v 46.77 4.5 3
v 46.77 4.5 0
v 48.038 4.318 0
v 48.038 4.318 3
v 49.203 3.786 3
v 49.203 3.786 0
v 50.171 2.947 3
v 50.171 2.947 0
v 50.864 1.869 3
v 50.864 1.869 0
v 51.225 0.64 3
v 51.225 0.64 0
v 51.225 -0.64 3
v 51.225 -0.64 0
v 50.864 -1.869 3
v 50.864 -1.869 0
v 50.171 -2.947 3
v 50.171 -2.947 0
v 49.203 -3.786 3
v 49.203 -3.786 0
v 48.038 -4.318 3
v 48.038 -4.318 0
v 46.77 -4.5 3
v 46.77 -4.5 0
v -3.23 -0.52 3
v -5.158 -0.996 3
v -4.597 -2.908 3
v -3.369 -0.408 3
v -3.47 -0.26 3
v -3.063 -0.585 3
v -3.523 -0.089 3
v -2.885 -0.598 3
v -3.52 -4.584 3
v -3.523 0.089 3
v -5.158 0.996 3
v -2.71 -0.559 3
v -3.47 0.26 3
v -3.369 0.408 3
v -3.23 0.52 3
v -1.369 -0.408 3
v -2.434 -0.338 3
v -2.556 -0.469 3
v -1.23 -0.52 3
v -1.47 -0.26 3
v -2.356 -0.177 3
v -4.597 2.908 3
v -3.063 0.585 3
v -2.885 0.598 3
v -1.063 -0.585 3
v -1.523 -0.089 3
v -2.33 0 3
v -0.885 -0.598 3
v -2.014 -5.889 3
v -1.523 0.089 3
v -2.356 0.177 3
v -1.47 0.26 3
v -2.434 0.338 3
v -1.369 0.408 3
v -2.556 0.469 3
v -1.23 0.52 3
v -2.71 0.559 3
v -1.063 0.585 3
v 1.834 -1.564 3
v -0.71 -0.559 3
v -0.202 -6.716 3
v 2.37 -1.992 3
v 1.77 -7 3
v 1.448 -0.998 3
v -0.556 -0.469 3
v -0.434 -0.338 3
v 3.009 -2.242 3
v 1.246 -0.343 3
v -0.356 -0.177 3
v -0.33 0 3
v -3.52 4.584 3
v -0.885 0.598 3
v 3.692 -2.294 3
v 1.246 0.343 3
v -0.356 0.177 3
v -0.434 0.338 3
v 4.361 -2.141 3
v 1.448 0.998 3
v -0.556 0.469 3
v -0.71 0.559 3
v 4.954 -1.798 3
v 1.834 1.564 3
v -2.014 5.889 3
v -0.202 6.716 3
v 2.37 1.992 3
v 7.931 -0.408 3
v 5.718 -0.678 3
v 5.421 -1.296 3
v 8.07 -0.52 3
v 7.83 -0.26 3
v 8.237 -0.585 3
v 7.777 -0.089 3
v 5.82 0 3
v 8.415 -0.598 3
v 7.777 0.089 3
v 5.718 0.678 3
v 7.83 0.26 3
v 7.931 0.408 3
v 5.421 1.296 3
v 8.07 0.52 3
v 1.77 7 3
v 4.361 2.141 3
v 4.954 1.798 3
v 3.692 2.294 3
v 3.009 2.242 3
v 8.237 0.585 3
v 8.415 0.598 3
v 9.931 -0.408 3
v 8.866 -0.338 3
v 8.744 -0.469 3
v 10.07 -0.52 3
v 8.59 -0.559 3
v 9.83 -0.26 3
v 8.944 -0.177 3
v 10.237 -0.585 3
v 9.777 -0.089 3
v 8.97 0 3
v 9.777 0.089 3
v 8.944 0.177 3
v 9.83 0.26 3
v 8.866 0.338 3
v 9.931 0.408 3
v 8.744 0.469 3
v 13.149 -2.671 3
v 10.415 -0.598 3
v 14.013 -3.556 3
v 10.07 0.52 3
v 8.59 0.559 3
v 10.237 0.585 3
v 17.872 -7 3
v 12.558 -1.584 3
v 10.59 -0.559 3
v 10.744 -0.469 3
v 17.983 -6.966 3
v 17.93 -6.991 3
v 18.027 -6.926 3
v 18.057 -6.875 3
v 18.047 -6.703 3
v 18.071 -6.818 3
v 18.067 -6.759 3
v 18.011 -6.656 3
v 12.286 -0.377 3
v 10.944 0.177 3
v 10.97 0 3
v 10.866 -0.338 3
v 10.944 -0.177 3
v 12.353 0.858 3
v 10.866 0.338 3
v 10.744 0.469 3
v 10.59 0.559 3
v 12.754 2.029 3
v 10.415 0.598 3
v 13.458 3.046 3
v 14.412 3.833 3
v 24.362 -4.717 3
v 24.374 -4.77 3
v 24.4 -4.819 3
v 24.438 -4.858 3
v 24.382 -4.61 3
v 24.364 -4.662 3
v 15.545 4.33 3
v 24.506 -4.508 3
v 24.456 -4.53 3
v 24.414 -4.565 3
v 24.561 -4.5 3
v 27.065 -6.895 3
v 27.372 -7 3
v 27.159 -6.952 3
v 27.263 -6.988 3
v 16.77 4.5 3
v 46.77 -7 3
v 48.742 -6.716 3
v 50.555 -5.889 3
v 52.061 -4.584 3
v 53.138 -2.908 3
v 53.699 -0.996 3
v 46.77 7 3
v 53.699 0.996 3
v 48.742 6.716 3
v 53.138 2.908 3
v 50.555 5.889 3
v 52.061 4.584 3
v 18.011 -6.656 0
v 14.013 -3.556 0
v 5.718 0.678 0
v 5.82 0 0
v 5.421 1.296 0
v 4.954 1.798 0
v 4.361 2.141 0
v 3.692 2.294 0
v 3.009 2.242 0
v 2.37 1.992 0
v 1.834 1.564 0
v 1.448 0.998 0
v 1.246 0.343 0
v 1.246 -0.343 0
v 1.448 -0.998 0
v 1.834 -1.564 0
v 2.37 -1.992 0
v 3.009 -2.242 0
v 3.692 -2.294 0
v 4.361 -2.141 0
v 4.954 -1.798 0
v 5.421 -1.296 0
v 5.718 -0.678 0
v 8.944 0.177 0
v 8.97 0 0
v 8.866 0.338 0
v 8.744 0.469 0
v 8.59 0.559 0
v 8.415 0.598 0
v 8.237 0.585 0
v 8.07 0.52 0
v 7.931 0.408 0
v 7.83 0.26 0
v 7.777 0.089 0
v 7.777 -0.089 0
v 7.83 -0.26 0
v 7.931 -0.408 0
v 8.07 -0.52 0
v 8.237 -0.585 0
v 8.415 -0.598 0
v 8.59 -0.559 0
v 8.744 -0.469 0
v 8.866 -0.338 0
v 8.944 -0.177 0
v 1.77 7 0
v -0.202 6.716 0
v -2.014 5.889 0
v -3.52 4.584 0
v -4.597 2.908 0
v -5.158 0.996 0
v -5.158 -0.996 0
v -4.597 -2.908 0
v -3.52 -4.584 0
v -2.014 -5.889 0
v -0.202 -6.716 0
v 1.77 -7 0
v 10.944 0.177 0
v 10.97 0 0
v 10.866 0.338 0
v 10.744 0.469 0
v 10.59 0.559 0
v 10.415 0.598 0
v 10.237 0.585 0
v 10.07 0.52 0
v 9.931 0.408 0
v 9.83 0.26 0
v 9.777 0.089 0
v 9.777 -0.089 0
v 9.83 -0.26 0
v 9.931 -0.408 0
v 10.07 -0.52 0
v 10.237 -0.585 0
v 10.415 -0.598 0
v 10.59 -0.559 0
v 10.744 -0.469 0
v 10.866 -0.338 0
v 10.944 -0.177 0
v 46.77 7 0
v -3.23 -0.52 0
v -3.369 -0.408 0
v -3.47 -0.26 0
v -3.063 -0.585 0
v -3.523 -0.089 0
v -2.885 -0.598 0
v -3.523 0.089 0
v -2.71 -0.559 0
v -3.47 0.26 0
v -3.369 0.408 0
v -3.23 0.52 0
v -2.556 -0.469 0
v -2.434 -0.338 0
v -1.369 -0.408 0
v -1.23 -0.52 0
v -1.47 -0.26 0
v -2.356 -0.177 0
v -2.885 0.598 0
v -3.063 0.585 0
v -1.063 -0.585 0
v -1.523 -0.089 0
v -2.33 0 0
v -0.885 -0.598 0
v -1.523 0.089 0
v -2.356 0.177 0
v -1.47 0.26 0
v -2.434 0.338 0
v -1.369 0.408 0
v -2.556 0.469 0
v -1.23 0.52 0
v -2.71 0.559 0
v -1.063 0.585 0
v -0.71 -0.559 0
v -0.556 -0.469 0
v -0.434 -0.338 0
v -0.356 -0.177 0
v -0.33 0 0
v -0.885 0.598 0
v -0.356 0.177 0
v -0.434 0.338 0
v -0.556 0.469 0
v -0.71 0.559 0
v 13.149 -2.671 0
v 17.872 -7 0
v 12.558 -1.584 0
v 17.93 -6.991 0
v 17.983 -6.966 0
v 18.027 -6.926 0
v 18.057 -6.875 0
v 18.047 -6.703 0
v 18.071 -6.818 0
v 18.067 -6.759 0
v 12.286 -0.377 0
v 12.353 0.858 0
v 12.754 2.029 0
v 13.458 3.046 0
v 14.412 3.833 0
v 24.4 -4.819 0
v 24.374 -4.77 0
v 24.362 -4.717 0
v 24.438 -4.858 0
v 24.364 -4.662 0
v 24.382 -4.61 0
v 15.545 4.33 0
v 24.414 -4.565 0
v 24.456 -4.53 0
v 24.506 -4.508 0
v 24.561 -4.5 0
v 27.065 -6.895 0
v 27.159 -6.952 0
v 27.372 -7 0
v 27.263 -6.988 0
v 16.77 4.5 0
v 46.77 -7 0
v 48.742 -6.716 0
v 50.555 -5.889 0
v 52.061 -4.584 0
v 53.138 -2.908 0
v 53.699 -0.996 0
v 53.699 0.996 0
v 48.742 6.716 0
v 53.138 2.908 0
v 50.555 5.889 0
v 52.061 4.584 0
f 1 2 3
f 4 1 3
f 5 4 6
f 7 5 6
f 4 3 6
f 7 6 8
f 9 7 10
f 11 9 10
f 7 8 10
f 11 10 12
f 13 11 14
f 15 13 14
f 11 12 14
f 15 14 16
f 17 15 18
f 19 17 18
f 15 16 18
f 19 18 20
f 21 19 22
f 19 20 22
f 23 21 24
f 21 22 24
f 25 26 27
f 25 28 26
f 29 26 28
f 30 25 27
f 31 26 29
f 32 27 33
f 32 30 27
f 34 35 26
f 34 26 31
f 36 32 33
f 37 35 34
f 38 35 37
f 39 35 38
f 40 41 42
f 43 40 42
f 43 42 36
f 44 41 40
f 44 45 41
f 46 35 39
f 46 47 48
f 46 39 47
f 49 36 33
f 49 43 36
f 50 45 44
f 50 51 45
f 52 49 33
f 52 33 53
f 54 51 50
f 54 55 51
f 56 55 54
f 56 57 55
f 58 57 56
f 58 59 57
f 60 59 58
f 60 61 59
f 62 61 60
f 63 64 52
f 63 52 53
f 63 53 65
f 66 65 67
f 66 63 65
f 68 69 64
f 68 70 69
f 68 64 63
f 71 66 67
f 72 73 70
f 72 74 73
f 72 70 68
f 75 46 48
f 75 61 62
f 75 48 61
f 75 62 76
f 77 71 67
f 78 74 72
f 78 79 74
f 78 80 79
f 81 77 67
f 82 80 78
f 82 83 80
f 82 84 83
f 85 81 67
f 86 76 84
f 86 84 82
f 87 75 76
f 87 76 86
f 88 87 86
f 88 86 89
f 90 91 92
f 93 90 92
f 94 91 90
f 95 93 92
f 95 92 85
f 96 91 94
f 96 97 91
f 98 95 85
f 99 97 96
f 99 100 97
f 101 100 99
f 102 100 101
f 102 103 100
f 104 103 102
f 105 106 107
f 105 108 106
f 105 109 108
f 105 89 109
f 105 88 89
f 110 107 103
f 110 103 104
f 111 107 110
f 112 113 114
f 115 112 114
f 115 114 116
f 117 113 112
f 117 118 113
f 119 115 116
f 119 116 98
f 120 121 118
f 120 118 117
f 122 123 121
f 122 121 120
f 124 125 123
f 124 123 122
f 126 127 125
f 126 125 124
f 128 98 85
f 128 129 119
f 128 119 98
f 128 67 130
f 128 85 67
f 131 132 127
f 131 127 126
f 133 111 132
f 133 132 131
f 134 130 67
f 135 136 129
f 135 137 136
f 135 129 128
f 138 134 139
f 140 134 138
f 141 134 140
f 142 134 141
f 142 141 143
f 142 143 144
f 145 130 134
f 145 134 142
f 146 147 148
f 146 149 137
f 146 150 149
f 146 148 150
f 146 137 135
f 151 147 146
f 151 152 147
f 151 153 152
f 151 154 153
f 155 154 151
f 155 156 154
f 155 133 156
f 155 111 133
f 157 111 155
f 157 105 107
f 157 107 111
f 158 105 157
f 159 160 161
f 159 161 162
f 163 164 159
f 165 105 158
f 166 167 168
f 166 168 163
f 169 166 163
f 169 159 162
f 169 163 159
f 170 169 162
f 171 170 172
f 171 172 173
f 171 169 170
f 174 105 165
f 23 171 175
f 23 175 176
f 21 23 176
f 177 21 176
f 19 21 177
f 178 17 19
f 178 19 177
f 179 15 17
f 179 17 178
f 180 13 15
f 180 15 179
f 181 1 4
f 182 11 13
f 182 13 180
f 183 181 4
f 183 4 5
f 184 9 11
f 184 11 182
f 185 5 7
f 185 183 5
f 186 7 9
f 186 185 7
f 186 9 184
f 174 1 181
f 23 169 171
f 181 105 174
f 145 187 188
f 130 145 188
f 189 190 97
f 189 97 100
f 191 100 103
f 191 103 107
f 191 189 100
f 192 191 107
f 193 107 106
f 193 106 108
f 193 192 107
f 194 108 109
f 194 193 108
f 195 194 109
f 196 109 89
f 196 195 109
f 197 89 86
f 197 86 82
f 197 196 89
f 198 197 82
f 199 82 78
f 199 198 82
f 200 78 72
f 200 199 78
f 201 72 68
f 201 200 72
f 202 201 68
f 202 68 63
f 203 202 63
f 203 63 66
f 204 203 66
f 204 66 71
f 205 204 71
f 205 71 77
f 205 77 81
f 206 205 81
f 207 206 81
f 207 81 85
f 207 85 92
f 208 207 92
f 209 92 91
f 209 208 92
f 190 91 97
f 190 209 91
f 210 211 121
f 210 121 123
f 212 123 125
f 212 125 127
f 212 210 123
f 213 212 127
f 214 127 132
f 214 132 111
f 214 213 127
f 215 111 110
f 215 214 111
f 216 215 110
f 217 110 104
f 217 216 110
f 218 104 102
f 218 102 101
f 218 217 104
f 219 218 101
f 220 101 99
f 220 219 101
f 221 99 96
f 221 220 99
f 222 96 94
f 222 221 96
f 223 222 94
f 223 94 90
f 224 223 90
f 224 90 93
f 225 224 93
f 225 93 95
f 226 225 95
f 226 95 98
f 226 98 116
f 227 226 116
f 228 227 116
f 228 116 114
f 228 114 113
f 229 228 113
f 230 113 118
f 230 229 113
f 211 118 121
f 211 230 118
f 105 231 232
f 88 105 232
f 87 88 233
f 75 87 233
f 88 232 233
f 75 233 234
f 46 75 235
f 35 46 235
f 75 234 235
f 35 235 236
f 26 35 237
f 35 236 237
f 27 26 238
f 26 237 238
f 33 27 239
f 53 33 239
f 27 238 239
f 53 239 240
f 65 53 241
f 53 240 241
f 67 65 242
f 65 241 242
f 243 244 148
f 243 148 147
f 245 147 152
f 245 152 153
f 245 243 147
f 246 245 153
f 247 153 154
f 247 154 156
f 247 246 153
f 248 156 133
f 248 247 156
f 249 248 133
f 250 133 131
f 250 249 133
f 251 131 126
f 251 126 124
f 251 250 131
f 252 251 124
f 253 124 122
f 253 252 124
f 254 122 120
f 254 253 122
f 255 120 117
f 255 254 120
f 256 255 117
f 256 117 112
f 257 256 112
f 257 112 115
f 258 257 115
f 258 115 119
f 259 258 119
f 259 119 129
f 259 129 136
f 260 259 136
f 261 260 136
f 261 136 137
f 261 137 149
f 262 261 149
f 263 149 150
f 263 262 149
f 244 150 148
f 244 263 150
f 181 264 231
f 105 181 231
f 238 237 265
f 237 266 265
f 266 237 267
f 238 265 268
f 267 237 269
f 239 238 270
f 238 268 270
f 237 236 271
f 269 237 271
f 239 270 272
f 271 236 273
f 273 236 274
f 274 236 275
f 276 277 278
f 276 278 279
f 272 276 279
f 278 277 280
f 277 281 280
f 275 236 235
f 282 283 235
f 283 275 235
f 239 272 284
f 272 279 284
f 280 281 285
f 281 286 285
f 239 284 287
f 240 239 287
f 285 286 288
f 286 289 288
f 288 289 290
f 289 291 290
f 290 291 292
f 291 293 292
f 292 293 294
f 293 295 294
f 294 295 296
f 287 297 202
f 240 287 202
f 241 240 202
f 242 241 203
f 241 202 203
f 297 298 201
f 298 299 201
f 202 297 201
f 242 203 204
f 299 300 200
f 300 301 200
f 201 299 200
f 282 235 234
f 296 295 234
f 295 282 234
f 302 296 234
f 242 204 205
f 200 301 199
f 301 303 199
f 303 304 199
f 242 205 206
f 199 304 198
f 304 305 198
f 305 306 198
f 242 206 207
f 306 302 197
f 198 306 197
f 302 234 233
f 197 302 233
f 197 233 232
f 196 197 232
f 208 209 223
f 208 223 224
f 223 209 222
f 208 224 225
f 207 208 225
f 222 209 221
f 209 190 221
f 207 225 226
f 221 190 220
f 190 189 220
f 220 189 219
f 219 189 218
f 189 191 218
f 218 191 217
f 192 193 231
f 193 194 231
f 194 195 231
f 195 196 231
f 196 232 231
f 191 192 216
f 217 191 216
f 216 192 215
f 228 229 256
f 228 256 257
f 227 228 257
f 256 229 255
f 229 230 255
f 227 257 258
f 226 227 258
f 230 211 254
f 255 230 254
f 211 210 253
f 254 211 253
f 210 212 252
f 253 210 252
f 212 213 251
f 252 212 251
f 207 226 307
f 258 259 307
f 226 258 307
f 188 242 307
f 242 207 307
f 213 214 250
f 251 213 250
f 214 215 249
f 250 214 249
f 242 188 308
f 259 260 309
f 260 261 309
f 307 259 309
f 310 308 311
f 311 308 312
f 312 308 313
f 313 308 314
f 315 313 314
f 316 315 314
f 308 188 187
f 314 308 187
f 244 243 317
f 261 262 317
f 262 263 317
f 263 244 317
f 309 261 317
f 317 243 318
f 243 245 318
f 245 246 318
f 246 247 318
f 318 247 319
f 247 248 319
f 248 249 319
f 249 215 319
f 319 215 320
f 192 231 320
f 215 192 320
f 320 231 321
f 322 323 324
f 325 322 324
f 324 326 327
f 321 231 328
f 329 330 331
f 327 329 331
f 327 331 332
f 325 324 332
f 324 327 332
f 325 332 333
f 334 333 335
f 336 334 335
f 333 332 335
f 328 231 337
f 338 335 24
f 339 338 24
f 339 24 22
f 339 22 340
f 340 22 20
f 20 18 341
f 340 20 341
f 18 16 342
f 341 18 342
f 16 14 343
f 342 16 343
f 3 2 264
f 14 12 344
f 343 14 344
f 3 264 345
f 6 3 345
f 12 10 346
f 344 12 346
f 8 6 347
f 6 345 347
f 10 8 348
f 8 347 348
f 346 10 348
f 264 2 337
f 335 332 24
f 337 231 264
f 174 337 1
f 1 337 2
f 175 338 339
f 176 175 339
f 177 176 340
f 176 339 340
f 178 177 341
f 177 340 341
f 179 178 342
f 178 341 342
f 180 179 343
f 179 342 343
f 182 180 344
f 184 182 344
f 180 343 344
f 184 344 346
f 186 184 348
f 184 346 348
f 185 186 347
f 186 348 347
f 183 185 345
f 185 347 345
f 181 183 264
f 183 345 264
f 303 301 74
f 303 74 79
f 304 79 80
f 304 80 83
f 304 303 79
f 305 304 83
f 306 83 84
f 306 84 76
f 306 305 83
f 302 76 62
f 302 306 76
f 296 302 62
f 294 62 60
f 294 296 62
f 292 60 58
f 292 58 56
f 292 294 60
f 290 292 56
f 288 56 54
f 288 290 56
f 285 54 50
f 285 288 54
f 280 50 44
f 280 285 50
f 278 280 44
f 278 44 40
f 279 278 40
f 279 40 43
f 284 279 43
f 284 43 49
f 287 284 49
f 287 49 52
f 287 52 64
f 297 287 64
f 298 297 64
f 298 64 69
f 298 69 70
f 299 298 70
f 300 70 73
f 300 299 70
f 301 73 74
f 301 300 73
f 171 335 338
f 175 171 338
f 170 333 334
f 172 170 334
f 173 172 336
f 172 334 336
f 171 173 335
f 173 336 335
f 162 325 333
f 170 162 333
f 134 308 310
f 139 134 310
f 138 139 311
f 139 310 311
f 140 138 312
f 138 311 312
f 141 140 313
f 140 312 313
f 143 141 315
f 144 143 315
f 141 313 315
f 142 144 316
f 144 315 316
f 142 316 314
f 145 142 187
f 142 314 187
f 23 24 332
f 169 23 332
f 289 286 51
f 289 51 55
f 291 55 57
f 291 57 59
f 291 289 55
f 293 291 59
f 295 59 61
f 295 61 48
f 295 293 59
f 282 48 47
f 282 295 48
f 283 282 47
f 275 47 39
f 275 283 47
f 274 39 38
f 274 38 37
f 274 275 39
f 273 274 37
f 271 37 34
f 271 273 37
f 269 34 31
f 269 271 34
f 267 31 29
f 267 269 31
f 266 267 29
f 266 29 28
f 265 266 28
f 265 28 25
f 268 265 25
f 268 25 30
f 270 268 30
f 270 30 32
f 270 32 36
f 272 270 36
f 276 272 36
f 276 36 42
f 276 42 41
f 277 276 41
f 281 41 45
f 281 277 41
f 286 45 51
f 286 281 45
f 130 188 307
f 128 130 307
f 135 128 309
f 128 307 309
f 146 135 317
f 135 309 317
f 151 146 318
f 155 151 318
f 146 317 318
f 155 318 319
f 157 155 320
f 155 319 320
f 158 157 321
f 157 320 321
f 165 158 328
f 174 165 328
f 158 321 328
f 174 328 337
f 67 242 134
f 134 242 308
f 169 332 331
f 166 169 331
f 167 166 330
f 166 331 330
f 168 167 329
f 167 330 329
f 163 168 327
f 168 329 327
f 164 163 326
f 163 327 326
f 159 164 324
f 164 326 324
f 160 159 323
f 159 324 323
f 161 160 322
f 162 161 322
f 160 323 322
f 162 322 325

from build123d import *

# Parameters (mm, degrees)
SKETCH2_R           = 2.3
SKETCH2_R_2         = 0.6
BOSS_EXTRUDE1_DEPTH = 3


with BuildPart() as part:
    # Sketch2 → Boss-Extrude1 (new body)
    with BuildSketch(Plane.XY):
        with BuildLine():
            Line((16.770369268, 4.5), (46.770369268, 4.5))
            ThreePointArc((46.770369268, 4.5), (51.270370099, 0), (46.770369268, -4.5))
            Line((46.770369268, -4.5), (24.560820229, -4.5))
            ThreePointArc((24.560820229, -4.5), (24.371598614, -4.635229787), (24.438260986, -4.858048195))
            Line((24.438260986, -4.858048195), (27.065199516, -6.895120487))
            ThreePointArc((27.065199516, -6.895120487), (27.209672091, -6.973054037), (27.371597624, -7))
            Line((27.371597624, -7), (46.770368806, -7))
            ThreePointArc((46.770368806, -7), (53.770370099, -2.31e-07), (46.770369268, 7))
            Line((46.770369268, 7), (1.770370099, 7))
            ThreePointArc((1.770370099, 7), (-5.229629901, 0), (1.770370099, -7))
            Line((1.770370099, -7), (17.871597624, -7))
            ThreePointArc((17.871597624, -7), (18.057004855, -6.874994391), (18.010642647, -6.656241586))
            Line((18.010642647, -6.656241586), (14.012786293, -3.556084383))
            ThreePointArc((14.012786293, -3.556084383), (12.512882937, 1.457329797), (16.770369268, 4.5))
        make_face()
        with Locations((3.520369683, 0)):
            Circle(SKETCH2_R, mode=Mode.SUBTRACT)
        with Locations((8.370369683, 0)):
            Circle(SKETCH2_R_2, mode=Mode.SUBTRACT)
        with Locations((10.370369683, 0)):
            Circle(SKETCH2_R_2, mode=Mode.SUBTRACT)
        with Locations((-0.929630317, 0)):
            Circle(SKETCH2_R_2, mode=Mode.SUBTRACT)
        with Locations((-2.929630317, 0)):
            Circle(SKETCH2_R_2, mode=Mode.SUBTRACT)
    extrude(amount=BOSS_EXTRUDE1_DEPTH)


solid = part.part
